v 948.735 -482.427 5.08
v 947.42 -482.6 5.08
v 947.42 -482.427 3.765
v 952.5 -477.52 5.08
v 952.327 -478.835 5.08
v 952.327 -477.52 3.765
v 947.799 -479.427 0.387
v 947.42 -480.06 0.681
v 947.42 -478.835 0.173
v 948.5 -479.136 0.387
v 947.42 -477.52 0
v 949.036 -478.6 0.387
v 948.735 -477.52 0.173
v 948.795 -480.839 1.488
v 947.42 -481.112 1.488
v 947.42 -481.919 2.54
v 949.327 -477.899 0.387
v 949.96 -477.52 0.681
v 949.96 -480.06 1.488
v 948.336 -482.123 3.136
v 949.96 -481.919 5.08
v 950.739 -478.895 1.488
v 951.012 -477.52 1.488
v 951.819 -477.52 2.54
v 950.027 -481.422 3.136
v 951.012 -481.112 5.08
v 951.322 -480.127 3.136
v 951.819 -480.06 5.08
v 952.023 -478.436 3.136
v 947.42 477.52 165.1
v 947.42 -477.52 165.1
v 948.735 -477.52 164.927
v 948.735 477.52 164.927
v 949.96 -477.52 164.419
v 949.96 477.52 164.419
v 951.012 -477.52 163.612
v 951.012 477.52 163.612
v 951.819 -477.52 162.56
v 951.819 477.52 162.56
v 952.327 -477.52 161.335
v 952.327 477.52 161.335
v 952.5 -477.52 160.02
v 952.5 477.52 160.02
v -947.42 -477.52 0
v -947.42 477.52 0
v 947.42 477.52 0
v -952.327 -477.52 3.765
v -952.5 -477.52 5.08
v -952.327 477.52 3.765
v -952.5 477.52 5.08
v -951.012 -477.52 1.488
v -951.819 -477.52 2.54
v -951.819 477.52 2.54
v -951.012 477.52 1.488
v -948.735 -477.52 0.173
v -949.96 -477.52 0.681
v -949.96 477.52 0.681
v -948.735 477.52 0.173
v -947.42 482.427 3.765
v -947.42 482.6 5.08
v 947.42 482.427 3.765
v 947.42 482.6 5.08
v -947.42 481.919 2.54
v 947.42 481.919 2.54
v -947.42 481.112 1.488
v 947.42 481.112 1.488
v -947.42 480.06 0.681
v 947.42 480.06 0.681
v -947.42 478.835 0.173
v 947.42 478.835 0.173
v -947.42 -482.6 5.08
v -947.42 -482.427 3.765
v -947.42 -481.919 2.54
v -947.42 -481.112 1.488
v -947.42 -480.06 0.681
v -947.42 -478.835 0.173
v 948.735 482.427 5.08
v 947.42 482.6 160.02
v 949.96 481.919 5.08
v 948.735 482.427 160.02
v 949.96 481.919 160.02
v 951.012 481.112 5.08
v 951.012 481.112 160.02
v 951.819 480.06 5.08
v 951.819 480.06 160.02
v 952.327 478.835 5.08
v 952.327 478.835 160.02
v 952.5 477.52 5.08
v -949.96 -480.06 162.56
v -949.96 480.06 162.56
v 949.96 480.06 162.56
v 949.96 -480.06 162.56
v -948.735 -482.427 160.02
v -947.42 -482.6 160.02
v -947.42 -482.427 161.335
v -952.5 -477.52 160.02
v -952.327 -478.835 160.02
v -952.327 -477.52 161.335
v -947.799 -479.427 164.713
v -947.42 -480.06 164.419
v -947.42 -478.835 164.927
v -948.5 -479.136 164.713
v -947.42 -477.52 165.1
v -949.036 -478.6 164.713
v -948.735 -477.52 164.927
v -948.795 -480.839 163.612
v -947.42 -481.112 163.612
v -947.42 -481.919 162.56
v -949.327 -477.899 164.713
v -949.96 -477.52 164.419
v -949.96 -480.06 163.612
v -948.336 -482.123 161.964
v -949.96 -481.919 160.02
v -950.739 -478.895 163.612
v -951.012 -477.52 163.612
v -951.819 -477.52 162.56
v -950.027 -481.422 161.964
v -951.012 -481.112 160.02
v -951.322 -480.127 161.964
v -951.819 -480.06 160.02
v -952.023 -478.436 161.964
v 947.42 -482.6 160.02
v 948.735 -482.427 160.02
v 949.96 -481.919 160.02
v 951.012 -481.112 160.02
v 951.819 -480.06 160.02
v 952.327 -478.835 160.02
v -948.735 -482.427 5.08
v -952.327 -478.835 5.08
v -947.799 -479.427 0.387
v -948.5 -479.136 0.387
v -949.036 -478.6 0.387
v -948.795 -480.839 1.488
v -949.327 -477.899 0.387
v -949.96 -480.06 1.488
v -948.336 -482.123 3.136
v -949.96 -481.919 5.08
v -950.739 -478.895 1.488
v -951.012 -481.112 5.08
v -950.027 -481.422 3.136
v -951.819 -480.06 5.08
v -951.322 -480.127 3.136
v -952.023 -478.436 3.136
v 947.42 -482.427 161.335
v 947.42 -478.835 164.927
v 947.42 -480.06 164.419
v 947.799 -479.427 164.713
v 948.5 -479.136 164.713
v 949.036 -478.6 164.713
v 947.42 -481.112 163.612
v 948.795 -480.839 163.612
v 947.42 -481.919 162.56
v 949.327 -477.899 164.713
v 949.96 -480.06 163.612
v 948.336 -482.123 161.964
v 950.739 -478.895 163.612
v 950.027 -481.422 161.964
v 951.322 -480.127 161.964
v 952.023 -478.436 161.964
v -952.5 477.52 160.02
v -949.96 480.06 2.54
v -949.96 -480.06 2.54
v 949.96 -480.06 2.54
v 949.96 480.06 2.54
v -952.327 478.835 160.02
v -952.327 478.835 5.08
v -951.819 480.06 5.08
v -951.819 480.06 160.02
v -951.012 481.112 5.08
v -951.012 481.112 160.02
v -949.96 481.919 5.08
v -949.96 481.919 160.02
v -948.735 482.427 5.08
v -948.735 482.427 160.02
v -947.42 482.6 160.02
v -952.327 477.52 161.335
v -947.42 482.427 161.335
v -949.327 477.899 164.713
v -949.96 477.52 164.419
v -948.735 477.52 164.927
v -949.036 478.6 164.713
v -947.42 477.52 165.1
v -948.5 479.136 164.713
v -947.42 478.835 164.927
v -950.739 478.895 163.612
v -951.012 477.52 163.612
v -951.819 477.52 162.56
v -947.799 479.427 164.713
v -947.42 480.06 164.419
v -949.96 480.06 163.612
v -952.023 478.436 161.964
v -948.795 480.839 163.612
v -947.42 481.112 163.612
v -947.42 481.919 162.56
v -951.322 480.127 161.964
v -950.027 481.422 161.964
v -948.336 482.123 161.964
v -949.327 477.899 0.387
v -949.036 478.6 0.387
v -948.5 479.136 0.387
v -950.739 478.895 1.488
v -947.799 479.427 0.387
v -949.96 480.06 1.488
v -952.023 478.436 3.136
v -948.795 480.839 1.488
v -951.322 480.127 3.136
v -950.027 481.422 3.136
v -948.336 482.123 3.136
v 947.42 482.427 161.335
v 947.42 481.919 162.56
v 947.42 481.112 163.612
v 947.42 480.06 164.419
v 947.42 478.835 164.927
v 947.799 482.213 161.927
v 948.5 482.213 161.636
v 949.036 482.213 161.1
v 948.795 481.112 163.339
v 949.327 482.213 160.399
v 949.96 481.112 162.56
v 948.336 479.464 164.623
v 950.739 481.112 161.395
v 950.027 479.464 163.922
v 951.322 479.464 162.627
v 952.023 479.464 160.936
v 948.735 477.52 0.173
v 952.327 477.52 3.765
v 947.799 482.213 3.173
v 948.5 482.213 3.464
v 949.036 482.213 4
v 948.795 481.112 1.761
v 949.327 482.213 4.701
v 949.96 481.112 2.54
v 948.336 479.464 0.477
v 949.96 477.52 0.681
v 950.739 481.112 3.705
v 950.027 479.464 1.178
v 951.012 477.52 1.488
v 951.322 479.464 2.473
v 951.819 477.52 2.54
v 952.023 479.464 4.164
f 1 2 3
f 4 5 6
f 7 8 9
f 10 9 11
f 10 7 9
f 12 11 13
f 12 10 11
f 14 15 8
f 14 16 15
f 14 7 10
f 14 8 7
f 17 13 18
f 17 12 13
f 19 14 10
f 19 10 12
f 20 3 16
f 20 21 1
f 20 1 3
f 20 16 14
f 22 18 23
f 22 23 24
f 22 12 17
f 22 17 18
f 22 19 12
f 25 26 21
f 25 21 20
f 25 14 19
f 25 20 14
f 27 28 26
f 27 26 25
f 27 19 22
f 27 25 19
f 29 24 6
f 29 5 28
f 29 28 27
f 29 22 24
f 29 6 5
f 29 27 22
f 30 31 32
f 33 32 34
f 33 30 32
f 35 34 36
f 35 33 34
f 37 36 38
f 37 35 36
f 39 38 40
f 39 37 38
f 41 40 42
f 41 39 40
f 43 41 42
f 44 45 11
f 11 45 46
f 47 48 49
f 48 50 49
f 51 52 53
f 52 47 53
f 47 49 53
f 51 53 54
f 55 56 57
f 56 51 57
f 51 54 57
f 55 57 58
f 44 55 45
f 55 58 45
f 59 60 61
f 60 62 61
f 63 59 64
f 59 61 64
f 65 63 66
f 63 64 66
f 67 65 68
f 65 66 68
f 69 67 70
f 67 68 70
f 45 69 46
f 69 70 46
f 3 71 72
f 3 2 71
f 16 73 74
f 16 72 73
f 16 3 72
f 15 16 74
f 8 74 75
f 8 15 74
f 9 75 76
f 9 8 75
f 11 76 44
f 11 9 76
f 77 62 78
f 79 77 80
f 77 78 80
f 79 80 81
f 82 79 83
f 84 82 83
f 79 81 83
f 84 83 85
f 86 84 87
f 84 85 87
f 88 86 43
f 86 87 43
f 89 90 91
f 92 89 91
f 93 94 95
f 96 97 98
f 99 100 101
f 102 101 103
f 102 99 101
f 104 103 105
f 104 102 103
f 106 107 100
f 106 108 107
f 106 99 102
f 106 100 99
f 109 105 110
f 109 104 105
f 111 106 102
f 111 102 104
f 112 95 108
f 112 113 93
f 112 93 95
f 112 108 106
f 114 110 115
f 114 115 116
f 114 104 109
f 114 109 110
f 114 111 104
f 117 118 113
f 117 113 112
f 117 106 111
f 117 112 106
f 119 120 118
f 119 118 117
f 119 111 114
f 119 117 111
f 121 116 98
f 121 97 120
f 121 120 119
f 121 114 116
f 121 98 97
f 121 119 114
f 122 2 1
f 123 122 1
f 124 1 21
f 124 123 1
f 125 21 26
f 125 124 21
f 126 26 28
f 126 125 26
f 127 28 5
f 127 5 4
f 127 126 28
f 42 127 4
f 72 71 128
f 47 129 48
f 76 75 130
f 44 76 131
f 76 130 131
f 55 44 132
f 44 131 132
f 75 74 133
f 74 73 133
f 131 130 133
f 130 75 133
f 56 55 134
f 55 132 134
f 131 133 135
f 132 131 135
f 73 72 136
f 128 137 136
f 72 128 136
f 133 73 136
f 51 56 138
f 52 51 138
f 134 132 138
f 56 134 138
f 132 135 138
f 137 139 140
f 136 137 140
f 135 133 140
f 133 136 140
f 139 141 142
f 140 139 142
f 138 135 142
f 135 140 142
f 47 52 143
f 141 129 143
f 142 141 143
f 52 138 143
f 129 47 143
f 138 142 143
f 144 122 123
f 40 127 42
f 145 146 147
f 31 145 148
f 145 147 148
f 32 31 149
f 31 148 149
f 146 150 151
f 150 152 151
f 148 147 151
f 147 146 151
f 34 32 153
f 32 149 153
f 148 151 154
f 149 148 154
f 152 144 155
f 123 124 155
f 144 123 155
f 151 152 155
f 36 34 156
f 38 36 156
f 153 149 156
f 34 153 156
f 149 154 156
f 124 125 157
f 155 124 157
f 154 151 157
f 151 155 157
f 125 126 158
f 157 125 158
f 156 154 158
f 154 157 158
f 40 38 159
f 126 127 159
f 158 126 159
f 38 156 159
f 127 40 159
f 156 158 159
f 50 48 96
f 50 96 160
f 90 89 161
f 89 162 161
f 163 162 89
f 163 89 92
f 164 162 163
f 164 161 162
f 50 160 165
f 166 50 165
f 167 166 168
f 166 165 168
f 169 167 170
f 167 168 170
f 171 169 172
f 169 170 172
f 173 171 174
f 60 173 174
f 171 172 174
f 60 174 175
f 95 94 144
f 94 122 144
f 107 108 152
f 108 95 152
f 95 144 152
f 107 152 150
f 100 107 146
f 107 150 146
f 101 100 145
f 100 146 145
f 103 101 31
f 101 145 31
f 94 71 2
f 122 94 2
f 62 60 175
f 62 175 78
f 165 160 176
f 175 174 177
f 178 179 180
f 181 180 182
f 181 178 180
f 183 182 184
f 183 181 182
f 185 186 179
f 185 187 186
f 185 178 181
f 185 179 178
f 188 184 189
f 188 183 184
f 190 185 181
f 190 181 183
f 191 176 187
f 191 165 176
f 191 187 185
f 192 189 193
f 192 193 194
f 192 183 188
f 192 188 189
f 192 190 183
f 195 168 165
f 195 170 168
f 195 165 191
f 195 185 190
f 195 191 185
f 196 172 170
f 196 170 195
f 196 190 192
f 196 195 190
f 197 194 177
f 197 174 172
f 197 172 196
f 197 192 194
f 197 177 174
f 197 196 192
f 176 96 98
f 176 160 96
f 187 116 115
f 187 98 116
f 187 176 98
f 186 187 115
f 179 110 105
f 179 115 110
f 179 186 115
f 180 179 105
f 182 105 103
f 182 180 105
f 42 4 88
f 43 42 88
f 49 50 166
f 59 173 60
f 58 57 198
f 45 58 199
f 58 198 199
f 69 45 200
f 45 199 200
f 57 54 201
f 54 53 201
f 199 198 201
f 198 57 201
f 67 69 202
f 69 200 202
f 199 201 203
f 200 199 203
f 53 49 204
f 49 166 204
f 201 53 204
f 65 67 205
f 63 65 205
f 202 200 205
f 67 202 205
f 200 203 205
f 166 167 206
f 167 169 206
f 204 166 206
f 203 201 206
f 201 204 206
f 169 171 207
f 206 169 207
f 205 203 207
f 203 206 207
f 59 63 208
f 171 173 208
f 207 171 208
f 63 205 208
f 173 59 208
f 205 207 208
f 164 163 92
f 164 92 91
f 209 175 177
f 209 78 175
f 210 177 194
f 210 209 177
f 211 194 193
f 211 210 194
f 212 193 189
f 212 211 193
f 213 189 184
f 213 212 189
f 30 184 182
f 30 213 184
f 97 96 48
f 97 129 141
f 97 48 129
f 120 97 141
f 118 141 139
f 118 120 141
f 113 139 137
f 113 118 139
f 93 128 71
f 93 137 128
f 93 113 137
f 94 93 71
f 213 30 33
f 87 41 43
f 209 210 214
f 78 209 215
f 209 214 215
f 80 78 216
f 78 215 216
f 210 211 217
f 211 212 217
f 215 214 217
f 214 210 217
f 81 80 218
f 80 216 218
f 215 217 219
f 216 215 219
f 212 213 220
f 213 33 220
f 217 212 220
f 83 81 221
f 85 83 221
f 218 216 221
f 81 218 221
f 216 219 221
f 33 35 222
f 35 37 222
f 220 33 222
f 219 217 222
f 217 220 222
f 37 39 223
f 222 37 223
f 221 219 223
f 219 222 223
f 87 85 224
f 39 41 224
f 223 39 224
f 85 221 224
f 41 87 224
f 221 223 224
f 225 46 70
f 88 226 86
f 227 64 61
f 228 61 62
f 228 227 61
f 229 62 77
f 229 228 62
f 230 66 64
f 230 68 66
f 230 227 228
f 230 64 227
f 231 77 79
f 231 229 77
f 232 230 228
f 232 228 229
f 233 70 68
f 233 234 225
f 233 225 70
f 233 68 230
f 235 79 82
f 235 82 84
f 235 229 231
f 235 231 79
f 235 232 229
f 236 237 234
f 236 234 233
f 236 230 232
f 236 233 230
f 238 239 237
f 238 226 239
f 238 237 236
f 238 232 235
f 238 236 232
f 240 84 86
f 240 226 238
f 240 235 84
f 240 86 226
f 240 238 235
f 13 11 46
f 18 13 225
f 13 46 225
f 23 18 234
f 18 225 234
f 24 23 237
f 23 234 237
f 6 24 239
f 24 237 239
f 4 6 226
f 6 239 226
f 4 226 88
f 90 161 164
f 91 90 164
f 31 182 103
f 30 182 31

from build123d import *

# Parameters (mm, degrees)
F0_W     = 1905
F0_H     = 965.2
F1_DEPTH = 165.1
F2_T     = -2.54
F3_R     = 5.08


with BuildPart() as f1:
    # F0 (on Top) → F1 (new body)
    with BuildSketch(Plane.XY):
        Rectangle(F0_W, F0_H)
    extrude(amount=F1_DEPTH)

    # F2 (hollow: no face is removed)
    offset(amount=F2_T, mode=Mode.SUBTRACT)

    # F3
    f3_edges = [f1.edges().sort_by_distance(p)[0] for p in [
        (-952.5, -482.6, 82.55),
        (952.5, -482.6, 82.55),
        (0, -482.6, 0),
        (0, -482.6, 165.1),
        (-952.5, 482.6, 82.55),
        (-952.5, 0, 0),
        (-952.5, 0, 165.1),
        (952.5, 0, 165.1),
        (0, 482.6, 165.1),
        (952.5, 0, 0),
        (0, 482.6, 0),
        (952.5, 482.6, 82.55),
    ]]
    fillet(f3_edges, radius=F3_R)


solid = f1.part
